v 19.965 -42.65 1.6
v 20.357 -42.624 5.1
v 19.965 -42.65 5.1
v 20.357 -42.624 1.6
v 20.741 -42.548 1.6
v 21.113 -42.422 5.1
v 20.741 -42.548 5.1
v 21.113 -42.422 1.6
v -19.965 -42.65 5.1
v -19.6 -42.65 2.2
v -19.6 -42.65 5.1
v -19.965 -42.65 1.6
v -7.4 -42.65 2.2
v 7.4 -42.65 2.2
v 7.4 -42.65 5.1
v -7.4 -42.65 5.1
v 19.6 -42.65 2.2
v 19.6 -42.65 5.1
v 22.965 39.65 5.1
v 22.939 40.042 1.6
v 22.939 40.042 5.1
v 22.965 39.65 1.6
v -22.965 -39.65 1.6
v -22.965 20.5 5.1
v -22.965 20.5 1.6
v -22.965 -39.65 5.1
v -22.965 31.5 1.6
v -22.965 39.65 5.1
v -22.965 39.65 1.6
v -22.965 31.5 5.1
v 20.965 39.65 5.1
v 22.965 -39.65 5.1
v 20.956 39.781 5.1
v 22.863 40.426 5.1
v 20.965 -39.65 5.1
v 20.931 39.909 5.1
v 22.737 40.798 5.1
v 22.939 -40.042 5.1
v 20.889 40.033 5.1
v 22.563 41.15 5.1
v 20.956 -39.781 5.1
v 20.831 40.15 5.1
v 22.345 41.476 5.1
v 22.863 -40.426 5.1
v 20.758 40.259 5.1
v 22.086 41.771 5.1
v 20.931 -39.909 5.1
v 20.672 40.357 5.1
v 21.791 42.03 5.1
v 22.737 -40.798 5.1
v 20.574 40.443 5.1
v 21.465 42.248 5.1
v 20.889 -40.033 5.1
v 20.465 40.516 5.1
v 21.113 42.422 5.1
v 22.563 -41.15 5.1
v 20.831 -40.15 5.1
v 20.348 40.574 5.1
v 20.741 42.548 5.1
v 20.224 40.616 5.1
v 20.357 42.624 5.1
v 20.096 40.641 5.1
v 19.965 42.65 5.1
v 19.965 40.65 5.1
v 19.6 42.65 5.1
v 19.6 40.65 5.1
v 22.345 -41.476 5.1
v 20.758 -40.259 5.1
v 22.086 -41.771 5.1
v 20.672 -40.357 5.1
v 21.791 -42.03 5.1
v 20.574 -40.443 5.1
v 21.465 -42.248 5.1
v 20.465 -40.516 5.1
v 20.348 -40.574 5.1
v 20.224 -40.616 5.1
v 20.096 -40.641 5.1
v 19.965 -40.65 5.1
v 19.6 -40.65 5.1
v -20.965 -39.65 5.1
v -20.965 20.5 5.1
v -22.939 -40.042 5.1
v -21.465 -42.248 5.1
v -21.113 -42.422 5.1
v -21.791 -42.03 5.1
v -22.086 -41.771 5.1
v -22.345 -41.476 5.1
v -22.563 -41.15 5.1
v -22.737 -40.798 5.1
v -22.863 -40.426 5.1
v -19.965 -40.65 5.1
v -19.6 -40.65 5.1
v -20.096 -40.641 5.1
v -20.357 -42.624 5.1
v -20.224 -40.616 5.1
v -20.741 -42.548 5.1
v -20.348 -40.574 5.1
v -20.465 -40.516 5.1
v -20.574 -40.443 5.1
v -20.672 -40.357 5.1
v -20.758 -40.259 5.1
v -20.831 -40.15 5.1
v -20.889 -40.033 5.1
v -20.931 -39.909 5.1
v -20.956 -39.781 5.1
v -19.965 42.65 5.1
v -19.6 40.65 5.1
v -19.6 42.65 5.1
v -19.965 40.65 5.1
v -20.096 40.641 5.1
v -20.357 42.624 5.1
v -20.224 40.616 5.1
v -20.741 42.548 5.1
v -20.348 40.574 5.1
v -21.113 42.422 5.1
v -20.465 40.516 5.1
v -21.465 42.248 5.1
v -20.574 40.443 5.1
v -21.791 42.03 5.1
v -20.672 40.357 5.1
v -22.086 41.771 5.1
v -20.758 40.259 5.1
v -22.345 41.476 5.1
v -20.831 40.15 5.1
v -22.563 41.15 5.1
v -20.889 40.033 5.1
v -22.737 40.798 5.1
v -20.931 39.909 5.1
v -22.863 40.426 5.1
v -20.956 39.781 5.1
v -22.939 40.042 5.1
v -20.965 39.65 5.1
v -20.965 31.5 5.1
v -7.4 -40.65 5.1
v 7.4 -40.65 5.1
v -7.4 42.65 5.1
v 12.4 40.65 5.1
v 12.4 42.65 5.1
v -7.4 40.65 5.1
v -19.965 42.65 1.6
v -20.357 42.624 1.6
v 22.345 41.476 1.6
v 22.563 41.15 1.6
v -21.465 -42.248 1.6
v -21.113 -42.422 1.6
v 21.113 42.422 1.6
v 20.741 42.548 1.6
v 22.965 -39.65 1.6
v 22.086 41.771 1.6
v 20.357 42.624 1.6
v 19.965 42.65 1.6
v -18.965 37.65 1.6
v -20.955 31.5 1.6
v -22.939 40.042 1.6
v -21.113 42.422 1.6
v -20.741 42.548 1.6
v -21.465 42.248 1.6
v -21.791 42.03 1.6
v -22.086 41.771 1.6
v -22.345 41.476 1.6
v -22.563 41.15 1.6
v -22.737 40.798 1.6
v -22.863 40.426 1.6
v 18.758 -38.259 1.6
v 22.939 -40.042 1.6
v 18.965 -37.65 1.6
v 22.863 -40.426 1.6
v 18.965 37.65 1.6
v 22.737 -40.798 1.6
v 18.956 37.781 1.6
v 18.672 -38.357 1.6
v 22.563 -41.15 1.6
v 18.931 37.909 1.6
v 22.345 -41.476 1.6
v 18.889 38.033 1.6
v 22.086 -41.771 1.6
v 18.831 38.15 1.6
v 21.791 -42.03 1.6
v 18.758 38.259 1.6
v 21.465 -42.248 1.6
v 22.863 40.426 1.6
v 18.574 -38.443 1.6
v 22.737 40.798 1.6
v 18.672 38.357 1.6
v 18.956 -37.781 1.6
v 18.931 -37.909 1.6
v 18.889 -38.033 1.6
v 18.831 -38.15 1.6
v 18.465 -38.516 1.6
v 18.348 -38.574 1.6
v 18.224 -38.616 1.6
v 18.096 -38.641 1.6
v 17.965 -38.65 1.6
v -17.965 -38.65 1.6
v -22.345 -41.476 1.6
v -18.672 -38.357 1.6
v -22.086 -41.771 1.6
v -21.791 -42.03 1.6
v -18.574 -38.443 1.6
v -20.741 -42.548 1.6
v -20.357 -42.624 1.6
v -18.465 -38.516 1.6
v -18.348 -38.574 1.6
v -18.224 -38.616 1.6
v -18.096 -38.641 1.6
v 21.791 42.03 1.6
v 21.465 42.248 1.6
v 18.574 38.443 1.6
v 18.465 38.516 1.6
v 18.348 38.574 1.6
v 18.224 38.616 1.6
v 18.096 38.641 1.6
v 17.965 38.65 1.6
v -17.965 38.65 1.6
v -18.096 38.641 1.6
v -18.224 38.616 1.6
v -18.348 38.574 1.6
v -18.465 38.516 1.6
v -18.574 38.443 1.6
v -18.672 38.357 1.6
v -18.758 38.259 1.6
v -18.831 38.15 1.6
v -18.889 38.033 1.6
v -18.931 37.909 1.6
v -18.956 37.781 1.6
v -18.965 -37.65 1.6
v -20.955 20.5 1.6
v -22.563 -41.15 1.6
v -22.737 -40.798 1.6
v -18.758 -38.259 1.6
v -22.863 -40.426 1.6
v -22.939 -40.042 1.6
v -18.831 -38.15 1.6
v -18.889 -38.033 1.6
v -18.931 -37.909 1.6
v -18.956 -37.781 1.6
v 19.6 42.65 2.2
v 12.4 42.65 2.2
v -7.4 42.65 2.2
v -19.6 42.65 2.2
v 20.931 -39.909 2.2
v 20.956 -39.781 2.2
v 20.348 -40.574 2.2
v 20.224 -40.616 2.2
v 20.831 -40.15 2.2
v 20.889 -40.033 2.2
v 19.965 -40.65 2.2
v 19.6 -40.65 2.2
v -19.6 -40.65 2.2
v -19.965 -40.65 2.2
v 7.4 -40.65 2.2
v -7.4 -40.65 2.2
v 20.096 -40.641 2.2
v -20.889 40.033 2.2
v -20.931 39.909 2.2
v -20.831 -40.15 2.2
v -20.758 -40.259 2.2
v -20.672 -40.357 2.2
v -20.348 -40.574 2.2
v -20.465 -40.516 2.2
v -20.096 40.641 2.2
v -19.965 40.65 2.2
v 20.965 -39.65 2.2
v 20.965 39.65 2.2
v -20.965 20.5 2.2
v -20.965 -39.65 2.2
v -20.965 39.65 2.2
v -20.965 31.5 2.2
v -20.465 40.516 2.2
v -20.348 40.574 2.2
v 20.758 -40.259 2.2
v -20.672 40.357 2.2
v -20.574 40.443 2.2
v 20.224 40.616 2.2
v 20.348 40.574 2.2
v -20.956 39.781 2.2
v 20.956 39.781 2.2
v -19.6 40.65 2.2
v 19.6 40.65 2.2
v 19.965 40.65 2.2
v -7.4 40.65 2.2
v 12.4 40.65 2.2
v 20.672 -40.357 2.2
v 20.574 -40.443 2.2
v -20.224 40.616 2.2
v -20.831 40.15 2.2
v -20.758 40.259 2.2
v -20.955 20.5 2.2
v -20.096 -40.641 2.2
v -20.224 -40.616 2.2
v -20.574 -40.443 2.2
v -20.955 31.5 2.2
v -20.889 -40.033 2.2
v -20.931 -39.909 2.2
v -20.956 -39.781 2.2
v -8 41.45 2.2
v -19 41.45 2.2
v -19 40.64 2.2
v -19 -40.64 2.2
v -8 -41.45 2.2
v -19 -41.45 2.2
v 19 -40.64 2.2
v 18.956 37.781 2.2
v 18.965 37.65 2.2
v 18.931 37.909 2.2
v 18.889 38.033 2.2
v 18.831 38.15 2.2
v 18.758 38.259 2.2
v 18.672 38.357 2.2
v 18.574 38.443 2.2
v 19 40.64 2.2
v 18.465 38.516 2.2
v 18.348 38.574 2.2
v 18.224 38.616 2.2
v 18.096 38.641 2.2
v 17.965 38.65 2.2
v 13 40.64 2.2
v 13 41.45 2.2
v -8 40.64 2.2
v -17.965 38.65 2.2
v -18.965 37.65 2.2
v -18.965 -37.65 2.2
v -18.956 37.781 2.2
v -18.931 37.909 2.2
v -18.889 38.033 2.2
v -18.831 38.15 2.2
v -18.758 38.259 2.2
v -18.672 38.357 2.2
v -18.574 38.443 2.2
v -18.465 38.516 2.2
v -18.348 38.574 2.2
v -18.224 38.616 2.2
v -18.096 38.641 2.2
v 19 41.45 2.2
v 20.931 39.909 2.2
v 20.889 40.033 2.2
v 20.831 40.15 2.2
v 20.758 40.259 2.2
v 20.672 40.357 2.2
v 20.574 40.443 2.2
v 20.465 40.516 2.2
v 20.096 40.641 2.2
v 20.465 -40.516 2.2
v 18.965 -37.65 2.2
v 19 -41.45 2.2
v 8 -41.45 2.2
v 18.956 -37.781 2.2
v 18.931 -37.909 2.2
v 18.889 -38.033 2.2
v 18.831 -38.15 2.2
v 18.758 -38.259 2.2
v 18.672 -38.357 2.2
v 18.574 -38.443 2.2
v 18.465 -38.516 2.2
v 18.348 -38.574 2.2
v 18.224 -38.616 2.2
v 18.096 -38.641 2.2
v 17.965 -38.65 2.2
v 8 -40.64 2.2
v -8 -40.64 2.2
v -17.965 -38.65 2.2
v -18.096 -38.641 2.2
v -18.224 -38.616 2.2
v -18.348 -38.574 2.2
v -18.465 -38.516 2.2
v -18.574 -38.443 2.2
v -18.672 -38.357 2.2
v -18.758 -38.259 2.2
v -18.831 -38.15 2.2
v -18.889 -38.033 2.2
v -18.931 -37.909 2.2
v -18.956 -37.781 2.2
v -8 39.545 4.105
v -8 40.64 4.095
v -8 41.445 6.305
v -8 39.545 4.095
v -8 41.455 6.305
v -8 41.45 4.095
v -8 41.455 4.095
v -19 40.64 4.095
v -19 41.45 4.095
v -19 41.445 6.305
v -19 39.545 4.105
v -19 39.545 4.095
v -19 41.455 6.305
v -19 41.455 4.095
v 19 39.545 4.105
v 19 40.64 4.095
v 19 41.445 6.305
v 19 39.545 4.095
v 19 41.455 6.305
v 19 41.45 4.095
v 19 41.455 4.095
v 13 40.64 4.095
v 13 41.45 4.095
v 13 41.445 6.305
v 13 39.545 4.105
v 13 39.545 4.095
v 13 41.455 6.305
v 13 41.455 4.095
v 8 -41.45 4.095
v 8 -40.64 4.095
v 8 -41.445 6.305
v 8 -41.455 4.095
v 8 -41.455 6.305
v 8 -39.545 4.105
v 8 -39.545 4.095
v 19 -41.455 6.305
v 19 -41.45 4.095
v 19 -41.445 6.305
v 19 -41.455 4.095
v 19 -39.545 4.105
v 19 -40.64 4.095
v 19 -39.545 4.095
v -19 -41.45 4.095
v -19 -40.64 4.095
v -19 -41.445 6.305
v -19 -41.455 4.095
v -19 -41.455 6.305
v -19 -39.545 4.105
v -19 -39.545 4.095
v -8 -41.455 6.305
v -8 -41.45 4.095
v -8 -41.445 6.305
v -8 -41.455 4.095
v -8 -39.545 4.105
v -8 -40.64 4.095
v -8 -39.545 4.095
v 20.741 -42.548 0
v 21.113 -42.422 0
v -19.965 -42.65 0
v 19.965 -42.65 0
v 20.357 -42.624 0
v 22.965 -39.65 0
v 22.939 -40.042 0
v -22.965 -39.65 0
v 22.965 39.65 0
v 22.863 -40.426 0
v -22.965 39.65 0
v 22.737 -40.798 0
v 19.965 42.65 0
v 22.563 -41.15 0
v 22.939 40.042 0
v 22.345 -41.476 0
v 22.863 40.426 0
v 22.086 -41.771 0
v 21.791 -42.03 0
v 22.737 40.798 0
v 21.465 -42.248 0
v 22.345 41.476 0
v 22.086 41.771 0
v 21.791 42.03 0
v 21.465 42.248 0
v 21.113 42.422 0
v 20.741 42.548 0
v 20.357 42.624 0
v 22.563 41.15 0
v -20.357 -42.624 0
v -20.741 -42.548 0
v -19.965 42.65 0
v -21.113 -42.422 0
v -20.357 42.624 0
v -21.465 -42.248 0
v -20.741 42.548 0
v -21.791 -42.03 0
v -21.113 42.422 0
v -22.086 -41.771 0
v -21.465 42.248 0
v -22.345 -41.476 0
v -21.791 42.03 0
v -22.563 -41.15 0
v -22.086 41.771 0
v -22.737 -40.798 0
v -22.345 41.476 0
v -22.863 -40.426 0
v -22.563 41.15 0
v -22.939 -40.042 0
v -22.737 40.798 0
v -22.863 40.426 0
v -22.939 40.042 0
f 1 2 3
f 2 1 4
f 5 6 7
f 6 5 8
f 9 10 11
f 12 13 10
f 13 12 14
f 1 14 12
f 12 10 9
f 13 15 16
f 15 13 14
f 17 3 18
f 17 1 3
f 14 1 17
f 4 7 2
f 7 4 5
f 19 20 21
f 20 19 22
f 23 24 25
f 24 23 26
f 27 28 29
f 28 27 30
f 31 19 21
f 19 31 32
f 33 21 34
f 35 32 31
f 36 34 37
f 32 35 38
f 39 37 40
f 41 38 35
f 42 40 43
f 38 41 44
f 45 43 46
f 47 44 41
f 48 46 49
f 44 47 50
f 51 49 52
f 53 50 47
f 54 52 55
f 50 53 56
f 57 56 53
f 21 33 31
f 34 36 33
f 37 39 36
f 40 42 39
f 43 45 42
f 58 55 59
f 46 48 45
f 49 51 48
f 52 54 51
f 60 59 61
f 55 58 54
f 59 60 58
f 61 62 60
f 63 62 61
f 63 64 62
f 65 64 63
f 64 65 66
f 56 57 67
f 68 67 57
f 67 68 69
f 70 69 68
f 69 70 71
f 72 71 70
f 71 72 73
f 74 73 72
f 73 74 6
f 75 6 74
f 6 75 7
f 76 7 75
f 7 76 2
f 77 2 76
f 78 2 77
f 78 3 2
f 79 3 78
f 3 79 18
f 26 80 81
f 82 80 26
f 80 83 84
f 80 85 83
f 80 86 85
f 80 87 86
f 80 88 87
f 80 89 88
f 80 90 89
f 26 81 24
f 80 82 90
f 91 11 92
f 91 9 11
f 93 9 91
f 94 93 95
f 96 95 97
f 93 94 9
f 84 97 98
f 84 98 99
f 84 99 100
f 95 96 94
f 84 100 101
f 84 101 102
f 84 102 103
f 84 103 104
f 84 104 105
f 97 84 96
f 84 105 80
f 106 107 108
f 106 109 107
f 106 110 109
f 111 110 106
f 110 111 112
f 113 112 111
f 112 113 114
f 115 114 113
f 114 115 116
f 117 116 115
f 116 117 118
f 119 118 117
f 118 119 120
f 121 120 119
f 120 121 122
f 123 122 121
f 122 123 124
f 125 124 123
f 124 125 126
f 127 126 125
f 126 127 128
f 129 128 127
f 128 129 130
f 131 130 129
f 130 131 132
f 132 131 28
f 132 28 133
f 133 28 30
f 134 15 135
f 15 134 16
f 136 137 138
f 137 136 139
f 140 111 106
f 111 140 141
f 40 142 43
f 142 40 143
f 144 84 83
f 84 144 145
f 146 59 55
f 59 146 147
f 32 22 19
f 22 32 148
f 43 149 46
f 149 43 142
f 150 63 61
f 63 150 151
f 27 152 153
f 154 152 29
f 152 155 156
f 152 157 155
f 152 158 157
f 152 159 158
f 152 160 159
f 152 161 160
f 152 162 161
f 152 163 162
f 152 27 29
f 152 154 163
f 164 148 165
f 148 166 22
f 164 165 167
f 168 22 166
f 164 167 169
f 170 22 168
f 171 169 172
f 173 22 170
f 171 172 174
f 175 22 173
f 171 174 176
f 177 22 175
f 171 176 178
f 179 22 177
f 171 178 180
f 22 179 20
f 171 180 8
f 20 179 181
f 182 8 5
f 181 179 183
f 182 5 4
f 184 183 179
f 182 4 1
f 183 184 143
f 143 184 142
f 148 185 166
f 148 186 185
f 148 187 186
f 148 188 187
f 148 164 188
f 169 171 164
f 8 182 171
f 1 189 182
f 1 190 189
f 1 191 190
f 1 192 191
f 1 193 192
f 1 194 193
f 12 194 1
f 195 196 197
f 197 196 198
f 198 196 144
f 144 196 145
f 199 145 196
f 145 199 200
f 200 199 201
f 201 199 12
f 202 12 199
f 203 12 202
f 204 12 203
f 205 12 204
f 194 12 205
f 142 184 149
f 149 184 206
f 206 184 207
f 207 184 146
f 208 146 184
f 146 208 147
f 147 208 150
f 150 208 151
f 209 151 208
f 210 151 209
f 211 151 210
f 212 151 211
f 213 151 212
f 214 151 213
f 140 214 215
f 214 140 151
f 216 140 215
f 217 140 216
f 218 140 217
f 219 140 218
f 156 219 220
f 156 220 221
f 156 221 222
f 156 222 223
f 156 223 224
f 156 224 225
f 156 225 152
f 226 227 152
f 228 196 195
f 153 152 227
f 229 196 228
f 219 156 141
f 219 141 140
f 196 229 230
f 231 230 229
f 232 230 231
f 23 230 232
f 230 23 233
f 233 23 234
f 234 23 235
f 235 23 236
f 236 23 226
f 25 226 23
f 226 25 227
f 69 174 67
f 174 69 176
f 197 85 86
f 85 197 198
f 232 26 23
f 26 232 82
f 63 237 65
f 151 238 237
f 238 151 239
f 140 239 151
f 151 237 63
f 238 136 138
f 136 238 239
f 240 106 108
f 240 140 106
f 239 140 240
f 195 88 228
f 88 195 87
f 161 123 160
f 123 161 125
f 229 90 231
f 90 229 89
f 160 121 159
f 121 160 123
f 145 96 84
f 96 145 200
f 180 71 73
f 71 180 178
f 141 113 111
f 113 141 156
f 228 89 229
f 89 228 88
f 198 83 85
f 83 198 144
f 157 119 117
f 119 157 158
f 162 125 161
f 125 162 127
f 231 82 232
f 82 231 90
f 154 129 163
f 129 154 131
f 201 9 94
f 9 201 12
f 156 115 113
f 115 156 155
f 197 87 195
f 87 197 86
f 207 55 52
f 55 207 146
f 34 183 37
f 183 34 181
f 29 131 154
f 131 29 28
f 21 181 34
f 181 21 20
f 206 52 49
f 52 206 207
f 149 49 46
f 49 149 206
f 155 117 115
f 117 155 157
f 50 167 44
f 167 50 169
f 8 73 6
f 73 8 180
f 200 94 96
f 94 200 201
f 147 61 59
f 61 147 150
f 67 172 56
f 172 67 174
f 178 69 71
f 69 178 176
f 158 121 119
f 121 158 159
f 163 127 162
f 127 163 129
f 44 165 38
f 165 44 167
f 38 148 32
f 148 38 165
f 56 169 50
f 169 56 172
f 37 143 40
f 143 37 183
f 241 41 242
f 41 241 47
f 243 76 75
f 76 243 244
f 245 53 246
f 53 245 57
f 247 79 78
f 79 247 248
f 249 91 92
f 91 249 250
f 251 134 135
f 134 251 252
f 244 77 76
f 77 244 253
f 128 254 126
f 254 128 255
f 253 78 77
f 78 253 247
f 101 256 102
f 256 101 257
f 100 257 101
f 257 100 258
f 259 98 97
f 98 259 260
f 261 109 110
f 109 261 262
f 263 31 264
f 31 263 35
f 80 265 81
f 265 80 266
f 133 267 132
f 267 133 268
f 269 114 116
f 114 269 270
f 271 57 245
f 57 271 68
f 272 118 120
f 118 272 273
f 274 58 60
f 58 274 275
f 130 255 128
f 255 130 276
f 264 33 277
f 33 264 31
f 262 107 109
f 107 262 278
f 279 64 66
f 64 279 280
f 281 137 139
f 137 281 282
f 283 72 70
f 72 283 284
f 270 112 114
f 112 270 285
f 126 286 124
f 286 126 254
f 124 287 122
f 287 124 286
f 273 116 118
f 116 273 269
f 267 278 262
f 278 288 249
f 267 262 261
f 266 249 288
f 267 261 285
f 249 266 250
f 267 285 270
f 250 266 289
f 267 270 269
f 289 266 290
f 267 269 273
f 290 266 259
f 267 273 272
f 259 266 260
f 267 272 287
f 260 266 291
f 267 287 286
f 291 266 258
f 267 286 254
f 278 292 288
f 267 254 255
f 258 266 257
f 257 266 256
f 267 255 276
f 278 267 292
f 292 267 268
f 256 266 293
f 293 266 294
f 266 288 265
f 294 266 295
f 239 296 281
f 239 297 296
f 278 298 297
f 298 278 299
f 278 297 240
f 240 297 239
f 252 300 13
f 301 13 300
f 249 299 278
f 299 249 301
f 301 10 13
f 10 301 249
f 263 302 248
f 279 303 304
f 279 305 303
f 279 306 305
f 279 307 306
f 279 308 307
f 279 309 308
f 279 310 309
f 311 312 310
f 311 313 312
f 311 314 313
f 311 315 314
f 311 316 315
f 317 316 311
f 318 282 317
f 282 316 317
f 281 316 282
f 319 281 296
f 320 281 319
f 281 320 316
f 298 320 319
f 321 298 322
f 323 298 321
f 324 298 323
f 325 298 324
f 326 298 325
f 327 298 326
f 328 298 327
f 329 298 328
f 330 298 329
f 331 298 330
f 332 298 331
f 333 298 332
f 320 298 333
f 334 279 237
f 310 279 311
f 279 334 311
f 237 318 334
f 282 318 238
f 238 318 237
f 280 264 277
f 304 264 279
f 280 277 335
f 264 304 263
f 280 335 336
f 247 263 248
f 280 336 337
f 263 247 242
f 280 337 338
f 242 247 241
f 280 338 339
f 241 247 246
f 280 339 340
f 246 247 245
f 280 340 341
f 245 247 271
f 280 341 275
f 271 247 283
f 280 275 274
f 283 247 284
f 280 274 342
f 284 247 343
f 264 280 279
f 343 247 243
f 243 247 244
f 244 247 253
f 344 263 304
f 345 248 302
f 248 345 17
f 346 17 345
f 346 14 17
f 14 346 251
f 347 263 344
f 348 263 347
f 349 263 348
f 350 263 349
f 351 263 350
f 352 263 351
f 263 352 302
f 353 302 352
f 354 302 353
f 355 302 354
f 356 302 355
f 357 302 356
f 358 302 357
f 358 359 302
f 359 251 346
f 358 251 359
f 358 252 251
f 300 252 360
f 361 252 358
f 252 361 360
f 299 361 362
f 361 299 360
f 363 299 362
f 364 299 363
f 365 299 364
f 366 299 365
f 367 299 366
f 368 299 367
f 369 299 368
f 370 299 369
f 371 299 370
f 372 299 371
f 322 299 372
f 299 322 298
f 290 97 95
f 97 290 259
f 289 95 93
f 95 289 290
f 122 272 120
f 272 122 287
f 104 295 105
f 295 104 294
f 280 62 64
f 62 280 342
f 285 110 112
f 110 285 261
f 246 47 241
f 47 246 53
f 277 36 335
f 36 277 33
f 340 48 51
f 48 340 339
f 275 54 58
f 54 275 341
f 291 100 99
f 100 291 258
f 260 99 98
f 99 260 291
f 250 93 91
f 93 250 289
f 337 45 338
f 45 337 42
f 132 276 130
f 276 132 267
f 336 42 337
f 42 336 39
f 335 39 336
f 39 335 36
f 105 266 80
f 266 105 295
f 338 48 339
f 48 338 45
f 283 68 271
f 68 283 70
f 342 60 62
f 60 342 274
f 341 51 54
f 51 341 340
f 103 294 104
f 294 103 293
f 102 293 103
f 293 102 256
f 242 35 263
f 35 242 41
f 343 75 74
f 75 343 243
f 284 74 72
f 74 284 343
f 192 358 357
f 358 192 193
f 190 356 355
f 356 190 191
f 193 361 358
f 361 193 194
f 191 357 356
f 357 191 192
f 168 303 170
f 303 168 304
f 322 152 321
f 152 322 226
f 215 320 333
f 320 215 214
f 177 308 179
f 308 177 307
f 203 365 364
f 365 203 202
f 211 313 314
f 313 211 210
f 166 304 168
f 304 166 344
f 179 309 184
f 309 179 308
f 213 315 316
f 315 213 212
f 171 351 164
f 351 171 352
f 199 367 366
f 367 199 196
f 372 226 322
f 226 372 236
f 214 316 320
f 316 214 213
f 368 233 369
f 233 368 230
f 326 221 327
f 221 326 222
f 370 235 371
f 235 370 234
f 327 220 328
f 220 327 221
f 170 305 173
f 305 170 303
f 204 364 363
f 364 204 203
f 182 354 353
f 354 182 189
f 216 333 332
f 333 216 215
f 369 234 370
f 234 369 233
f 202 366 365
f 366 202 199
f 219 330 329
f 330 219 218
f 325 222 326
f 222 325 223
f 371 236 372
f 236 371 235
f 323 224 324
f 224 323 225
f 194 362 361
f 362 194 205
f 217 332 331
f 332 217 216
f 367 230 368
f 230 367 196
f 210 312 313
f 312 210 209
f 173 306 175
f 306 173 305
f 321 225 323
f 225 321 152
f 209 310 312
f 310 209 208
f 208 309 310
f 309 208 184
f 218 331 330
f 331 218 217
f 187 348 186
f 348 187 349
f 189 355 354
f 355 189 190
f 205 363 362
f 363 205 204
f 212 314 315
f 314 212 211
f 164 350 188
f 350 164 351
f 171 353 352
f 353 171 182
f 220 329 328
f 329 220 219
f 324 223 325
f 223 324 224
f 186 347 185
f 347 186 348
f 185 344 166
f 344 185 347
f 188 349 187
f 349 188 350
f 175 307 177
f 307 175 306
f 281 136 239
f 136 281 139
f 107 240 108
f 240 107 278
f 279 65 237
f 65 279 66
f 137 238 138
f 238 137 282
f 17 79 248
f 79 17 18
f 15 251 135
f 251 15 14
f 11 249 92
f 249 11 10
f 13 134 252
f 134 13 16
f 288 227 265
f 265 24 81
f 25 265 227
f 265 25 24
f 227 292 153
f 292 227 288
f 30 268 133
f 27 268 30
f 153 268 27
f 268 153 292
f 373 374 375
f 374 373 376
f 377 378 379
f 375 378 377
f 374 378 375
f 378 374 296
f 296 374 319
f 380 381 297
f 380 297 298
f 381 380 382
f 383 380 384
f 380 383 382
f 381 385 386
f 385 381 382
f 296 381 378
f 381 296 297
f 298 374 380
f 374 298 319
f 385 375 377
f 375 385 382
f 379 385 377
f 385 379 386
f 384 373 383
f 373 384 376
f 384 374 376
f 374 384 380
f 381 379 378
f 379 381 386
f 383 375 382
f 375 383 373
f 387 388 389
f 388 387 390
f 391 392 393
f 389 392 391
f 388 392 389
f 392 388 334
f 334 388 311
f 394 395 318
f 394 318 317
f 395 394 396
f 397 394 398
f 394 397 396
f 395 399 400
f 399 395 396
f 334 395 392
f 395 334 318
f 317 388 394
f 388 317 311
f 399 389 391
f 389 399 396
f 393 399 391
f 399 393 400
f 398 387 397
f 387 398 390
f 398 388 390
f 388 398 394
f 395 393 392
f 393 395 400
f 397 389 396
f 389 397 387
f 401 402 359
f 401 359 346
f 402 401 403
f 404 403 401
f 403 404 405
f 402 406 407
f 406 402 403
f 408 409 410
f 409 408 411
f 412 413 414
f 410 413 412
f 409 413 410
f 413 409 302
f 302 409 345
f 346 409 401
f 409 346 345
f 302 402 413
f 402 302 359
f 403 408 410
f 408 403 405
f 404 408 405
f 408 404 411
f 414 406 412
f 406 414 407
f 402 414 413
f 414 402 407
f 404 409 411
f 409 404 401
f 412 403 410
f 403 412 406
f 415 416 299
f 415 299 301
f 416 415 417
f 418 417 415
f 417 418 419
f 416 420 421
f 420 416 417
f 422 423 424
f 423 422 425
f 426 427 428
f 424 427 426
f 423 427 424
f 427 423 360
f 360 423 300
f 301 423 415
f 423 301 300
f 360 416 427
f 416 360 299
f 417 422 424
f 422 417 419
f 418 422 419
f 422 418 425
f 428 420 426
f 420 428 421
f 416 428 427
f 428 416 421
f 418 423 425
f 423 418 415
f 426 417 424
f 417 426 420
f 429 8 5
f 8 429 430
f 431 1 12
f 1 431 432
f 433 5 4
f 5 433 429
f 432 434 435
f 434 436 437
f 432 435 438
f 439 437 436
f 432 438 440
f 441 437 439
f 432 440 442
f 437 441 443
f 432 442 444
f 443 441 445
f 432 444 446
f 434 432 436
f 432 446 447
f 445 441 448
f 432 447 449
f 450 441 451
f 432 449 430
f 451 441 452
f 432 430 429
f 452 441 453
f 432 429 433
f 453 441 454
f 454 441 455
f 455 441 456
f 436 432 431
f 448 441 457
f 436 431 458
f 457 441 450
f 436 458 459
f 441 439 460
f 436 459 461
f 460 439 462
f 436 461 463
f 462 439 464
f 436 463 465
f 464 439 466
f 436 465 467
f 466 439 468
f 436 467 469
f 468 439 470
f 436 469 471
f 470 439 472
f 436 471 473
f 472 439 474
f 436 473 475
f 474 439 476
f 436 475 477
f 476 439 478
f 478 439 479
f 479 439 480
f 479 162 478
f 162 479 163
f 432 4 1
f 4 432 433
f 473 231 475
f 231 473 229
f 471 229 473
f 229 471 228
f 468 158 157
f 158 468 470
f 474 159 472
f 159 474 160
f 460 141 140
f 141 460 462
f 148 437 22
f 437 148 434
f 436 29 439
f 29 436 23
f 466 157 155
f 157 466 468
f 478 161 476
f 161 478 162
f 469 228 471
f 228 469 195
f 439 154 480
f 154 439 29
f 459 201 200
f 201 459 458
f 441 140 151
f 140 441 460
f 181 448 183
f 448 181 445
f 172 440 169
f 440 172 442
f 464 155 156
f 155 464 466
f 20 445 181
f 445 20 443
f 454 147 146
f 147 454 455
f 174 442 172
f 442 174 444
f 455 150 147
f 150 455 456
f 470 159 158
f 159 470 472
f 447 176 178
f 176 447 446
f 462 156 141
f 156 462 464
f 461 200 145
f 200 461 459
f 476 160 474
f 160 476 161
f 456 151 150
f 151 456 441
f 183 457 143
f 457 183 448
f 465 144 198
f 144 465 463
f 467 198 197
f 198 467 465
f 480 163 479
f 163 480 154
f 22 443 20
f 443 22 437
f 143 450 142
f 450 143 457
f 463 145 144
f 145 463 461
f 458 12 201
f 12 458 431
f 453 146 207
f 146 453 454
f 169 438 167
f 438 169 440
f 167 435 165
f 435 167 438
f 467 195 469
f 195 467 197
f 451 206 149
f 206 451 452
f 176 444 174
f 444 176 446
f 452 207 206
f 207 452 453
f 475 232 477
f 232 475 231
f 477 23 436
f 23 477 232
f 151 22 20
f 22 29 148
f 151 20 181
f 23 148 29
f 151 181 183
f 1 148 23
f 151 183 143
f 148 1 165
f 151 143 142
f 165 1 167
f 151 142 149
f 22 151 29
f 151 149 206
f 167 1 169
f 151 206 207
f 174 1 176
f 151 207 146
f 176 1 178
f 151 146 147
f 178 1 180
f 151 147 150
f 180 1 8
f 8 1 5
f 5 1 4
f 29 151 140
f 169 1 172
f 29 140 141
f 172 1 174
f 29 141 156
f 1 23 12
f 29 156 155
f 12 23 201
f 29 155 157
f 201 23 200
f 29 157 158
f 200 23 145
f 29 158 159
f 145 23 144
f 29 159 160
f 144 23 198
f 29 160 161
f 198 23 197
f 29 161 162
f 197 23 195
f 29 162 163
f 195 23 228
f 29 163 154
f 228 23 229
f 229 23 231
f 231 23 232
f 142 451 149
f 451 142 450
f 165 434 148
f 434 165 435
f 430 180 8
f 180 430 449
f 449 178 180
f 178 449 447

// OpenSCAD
// EE04 snap-on frame
// =====================================================================
// Lightweight snap-fit bezel for the Seeed XIAO ePaper Display Board
// EE04. Open back, open center window, cantilever snap clips that grip
// the board's back edge. No bottom layer.
//
// Board outline + thickness taken from the official KiCad PCB
// (XIAO ePaper Display Board EE04_V1.2):
//   outline 41.23 x 80.00 mm, 1.6 mm thick.
//
// Print orientation: bezel face DOWN on the bed, clips pointing up (+Z).
// Assemble by pressing the board in from the open back until the four
// corner clips snap over its rear face.
//
// Cutouts: a test print showed the thin rim clears the buttons, the
// display ribbon and the battery JST without help — only the USB-C port
// (on the XIAO, near the top of the LEFT edge) actually needs an opening.
// The button/ribbon/battery positions are kept commented in port_cuts in
// case a future panel or board revision fouls the rim.
// =====================================================================

/* ---- board (from PCB) ---------------------------------------------- */
board_w = 41.23; // X
board_h = 80.00; // Y
board_t = 1.60; // thickness

/* ---- fit / frame --------------------------------------------------- */
fit = 0.35; // clearance per side around the board
fit_long = 0.3; // extra clearance per side on the long (80 mm) axis
t_play = 0.3; // extra thickness room — the hook catches this much proud
wall = 2.0; // side-wall thickness
bezel = 2.0; // front lip overlapping the board face (inward)
bezel_t = 0.6; // front lip thickness — kept minimal (just a forward stop)
corner_r = 3.0; // outer corner radius
eps = 0.01;
bottom_h = 1.6;

/* ---- snap clips ---------------------------------------------------- */
clip_w = 11.0; // clip finger width (along the wall) — wide for a firm grab
clip_t = 0.8; // clip finger thickness (radial) — thin so it flexes, not cracks
slot_w = 0.6; // gap each side of the finger (sets the cantilever)
hook_reach = 1.1; // how far the hook overlaps the board's back face (the grab)
hook_h = 2.2; // hook height above board back — tall so the finger stays compliant

/* ---- preview ------------------------------------------------------- */
show_board = true; // ghost the board to check fit; turn off to export

/* ---- derived ------------------------------------------------------- */
pocket_w = board_w + 2 * fit;
pocket_h = board_h + 2 * (fit + fit_long);
outer_w = pocket_w + 2 * wall;
outer_h = pocket_h + 2 * wall;
wall_h_hook = bezel_t + board_t + t_play;
extra_h = 1;
wall_h = extra_h + bezel_t + board_t + t_play; // hook catches t_play proud of the board back
win_w = pocket_w - 2 * bezel; // front window opening
win_h = pocket_h - 2 * bezel;
$fn = 48;

// Clip placements: [z-rotation, inner-face distance, offset along wall, width].
// Short (top/bottom) walls only — the long edges are lined with components,
// so no clips there. The top-right clip is narrowed and shifted to slot
// between the battery JST (ends at x≈31.6) and the corner.
clips = [
  [0, pocket_h / 2, -13.5, clip_w], // top-left
  [0, pocket_h / 2, 16.0, 6.0], // top-right (clears battery JST)
  [180, pocket_h / 2, -13.5, clip_w], // bottom-left
  [180, pocket_h / 2, 13.5, clip_w], // bottom-right
];

// Edge cutouts: [z-rotation, inner-face distance, offset along wall, width]
// Offsets derived from PCB part positions (board portrait, origin top-left:
// LEFT offset = 40 - y, RIGHT offset = y - 40, TOP offset = x - 20.6).
port_cuts = [
  // LEFT edge (rot 90): USB-C — the only opening the thin rim needs
  [90, pocket_w / 2, 26.0, 11], // USB-C   (XIAO)
  // Everything below clears the rim without a cutout (verified on a print).
  // Re-enable only if a board/panel revision fouls the edge:
  // [  90, pocket_w / 2,   8.4,  6], // user key (SW3)
  // [  90, pocket_w / 2,  -0.9,  6], // user key (SW4)
  // [  90, pocket_w / 2, -10.3,  6], // user key (SW5)
  // [  90, pocket_w / 2, -19.6,  6], // reset    (SW2)
  // [  90, pocket_w / 2, -29.7,  7], // power sw (SW1)
  // [ -90, pocket_w / 2,  14.5, 33], // 50-pin FPC ribbon (J1)
  // [   0, pocket_h / 2,   7.4,  8], // battery JST (J3)
];

module rrect(w, h, r) {
  offset(r=r) offset(r=-r) square([w, h], center=true);
}

module bottom() {
  linear_extrude(bottom_h) rrect(outer_w, outer_h, corner_r);
}

module frame_body() {
  difference() {
    linear_extrude(wall_h) rrect(outer_w, outer_h, corner_r);
    // board pocket, open at the back
    translate([0, 0, bezel_t])
      linear_extrude(wall_h) rrect(pocket_w, pocket_h, 1.0);
    // front window, open center
    translate([0, 0, -eps])
      linear_extrude(bezel_t + 2 * eps) rrect(win_w, win_h, 1.0);
  }
}

// recess carved into the wall so the finger can flex outward
module clip_window(inner, w) {
  translate([-(w + 2 * slot_w) / 2, inner - eps, bezel_t])
    cube(
      [
        w + 2 * slot_w,
        wall + 2 * eps,
        wall_h_hook + 1 + hook_h - bezel_t + eps,
      ]
    );
}

// the cantilever finger + retaining hook
module clip_finger(inner, w) {
  // beam up to the board back
  translate([-w / 2, inner - eps, bezel_t])
    cube([w, clip_t + eps, wall_h_hook - bezel_t]);
  // hook: catching face on the bottom, lead-in slope on top
  hull() {
    for (
      p = [
        [inner + clip_t, wall_h_hook],
        [inner + clip_t, wall_h_hook + hook_h],
        [inner - hook_reach, wall_h_hook],
      ]
    )
      translate([0, p[0], p[1]]) cube([w, eps, eps], center=true);
  }
}

module place(c) rotate([0, 0, c[0]]) translate([c[2], 0, 0]) children();

module ee04_frame() {
  difference() {
    frame_body();
    for (c = clips) place(c) clip_window(c[1], c[3]);
    for (p = port_cuts)
      rotate([0, 0, p[0]]) translate([p[2], 0, 0])
          translate([-p[3] / 2, p[1] - eps, -eps])
            cube([p[3], wall + 2 * eps, wall_h + 2 * eps]);
  }
  for (c = clips) place(c) clip_finger(c[1], c[3]);
}

module IOCutouts() {
  big = 1e3;
  intersection() {
    cube(big);

    translate([-86, 116.86 / 2, 0])
      rotate([-90, 0, 0])
        import("display outer enclosure.stl");
  }
}

// CODE
bottom();

// translate([-0.5 * board_w, 16 + 0.5 * board_h, 0])
//   rotate([0, 0, 180])
//     IOCutouts();

translate([0, 0, bottom_h]) {
  ee04_frame();

  if (show_board)
    %translate([0, 0, bezel_t])
      linear_extrude(board_t) rrect(board_w, board_h, 3.0);
}
